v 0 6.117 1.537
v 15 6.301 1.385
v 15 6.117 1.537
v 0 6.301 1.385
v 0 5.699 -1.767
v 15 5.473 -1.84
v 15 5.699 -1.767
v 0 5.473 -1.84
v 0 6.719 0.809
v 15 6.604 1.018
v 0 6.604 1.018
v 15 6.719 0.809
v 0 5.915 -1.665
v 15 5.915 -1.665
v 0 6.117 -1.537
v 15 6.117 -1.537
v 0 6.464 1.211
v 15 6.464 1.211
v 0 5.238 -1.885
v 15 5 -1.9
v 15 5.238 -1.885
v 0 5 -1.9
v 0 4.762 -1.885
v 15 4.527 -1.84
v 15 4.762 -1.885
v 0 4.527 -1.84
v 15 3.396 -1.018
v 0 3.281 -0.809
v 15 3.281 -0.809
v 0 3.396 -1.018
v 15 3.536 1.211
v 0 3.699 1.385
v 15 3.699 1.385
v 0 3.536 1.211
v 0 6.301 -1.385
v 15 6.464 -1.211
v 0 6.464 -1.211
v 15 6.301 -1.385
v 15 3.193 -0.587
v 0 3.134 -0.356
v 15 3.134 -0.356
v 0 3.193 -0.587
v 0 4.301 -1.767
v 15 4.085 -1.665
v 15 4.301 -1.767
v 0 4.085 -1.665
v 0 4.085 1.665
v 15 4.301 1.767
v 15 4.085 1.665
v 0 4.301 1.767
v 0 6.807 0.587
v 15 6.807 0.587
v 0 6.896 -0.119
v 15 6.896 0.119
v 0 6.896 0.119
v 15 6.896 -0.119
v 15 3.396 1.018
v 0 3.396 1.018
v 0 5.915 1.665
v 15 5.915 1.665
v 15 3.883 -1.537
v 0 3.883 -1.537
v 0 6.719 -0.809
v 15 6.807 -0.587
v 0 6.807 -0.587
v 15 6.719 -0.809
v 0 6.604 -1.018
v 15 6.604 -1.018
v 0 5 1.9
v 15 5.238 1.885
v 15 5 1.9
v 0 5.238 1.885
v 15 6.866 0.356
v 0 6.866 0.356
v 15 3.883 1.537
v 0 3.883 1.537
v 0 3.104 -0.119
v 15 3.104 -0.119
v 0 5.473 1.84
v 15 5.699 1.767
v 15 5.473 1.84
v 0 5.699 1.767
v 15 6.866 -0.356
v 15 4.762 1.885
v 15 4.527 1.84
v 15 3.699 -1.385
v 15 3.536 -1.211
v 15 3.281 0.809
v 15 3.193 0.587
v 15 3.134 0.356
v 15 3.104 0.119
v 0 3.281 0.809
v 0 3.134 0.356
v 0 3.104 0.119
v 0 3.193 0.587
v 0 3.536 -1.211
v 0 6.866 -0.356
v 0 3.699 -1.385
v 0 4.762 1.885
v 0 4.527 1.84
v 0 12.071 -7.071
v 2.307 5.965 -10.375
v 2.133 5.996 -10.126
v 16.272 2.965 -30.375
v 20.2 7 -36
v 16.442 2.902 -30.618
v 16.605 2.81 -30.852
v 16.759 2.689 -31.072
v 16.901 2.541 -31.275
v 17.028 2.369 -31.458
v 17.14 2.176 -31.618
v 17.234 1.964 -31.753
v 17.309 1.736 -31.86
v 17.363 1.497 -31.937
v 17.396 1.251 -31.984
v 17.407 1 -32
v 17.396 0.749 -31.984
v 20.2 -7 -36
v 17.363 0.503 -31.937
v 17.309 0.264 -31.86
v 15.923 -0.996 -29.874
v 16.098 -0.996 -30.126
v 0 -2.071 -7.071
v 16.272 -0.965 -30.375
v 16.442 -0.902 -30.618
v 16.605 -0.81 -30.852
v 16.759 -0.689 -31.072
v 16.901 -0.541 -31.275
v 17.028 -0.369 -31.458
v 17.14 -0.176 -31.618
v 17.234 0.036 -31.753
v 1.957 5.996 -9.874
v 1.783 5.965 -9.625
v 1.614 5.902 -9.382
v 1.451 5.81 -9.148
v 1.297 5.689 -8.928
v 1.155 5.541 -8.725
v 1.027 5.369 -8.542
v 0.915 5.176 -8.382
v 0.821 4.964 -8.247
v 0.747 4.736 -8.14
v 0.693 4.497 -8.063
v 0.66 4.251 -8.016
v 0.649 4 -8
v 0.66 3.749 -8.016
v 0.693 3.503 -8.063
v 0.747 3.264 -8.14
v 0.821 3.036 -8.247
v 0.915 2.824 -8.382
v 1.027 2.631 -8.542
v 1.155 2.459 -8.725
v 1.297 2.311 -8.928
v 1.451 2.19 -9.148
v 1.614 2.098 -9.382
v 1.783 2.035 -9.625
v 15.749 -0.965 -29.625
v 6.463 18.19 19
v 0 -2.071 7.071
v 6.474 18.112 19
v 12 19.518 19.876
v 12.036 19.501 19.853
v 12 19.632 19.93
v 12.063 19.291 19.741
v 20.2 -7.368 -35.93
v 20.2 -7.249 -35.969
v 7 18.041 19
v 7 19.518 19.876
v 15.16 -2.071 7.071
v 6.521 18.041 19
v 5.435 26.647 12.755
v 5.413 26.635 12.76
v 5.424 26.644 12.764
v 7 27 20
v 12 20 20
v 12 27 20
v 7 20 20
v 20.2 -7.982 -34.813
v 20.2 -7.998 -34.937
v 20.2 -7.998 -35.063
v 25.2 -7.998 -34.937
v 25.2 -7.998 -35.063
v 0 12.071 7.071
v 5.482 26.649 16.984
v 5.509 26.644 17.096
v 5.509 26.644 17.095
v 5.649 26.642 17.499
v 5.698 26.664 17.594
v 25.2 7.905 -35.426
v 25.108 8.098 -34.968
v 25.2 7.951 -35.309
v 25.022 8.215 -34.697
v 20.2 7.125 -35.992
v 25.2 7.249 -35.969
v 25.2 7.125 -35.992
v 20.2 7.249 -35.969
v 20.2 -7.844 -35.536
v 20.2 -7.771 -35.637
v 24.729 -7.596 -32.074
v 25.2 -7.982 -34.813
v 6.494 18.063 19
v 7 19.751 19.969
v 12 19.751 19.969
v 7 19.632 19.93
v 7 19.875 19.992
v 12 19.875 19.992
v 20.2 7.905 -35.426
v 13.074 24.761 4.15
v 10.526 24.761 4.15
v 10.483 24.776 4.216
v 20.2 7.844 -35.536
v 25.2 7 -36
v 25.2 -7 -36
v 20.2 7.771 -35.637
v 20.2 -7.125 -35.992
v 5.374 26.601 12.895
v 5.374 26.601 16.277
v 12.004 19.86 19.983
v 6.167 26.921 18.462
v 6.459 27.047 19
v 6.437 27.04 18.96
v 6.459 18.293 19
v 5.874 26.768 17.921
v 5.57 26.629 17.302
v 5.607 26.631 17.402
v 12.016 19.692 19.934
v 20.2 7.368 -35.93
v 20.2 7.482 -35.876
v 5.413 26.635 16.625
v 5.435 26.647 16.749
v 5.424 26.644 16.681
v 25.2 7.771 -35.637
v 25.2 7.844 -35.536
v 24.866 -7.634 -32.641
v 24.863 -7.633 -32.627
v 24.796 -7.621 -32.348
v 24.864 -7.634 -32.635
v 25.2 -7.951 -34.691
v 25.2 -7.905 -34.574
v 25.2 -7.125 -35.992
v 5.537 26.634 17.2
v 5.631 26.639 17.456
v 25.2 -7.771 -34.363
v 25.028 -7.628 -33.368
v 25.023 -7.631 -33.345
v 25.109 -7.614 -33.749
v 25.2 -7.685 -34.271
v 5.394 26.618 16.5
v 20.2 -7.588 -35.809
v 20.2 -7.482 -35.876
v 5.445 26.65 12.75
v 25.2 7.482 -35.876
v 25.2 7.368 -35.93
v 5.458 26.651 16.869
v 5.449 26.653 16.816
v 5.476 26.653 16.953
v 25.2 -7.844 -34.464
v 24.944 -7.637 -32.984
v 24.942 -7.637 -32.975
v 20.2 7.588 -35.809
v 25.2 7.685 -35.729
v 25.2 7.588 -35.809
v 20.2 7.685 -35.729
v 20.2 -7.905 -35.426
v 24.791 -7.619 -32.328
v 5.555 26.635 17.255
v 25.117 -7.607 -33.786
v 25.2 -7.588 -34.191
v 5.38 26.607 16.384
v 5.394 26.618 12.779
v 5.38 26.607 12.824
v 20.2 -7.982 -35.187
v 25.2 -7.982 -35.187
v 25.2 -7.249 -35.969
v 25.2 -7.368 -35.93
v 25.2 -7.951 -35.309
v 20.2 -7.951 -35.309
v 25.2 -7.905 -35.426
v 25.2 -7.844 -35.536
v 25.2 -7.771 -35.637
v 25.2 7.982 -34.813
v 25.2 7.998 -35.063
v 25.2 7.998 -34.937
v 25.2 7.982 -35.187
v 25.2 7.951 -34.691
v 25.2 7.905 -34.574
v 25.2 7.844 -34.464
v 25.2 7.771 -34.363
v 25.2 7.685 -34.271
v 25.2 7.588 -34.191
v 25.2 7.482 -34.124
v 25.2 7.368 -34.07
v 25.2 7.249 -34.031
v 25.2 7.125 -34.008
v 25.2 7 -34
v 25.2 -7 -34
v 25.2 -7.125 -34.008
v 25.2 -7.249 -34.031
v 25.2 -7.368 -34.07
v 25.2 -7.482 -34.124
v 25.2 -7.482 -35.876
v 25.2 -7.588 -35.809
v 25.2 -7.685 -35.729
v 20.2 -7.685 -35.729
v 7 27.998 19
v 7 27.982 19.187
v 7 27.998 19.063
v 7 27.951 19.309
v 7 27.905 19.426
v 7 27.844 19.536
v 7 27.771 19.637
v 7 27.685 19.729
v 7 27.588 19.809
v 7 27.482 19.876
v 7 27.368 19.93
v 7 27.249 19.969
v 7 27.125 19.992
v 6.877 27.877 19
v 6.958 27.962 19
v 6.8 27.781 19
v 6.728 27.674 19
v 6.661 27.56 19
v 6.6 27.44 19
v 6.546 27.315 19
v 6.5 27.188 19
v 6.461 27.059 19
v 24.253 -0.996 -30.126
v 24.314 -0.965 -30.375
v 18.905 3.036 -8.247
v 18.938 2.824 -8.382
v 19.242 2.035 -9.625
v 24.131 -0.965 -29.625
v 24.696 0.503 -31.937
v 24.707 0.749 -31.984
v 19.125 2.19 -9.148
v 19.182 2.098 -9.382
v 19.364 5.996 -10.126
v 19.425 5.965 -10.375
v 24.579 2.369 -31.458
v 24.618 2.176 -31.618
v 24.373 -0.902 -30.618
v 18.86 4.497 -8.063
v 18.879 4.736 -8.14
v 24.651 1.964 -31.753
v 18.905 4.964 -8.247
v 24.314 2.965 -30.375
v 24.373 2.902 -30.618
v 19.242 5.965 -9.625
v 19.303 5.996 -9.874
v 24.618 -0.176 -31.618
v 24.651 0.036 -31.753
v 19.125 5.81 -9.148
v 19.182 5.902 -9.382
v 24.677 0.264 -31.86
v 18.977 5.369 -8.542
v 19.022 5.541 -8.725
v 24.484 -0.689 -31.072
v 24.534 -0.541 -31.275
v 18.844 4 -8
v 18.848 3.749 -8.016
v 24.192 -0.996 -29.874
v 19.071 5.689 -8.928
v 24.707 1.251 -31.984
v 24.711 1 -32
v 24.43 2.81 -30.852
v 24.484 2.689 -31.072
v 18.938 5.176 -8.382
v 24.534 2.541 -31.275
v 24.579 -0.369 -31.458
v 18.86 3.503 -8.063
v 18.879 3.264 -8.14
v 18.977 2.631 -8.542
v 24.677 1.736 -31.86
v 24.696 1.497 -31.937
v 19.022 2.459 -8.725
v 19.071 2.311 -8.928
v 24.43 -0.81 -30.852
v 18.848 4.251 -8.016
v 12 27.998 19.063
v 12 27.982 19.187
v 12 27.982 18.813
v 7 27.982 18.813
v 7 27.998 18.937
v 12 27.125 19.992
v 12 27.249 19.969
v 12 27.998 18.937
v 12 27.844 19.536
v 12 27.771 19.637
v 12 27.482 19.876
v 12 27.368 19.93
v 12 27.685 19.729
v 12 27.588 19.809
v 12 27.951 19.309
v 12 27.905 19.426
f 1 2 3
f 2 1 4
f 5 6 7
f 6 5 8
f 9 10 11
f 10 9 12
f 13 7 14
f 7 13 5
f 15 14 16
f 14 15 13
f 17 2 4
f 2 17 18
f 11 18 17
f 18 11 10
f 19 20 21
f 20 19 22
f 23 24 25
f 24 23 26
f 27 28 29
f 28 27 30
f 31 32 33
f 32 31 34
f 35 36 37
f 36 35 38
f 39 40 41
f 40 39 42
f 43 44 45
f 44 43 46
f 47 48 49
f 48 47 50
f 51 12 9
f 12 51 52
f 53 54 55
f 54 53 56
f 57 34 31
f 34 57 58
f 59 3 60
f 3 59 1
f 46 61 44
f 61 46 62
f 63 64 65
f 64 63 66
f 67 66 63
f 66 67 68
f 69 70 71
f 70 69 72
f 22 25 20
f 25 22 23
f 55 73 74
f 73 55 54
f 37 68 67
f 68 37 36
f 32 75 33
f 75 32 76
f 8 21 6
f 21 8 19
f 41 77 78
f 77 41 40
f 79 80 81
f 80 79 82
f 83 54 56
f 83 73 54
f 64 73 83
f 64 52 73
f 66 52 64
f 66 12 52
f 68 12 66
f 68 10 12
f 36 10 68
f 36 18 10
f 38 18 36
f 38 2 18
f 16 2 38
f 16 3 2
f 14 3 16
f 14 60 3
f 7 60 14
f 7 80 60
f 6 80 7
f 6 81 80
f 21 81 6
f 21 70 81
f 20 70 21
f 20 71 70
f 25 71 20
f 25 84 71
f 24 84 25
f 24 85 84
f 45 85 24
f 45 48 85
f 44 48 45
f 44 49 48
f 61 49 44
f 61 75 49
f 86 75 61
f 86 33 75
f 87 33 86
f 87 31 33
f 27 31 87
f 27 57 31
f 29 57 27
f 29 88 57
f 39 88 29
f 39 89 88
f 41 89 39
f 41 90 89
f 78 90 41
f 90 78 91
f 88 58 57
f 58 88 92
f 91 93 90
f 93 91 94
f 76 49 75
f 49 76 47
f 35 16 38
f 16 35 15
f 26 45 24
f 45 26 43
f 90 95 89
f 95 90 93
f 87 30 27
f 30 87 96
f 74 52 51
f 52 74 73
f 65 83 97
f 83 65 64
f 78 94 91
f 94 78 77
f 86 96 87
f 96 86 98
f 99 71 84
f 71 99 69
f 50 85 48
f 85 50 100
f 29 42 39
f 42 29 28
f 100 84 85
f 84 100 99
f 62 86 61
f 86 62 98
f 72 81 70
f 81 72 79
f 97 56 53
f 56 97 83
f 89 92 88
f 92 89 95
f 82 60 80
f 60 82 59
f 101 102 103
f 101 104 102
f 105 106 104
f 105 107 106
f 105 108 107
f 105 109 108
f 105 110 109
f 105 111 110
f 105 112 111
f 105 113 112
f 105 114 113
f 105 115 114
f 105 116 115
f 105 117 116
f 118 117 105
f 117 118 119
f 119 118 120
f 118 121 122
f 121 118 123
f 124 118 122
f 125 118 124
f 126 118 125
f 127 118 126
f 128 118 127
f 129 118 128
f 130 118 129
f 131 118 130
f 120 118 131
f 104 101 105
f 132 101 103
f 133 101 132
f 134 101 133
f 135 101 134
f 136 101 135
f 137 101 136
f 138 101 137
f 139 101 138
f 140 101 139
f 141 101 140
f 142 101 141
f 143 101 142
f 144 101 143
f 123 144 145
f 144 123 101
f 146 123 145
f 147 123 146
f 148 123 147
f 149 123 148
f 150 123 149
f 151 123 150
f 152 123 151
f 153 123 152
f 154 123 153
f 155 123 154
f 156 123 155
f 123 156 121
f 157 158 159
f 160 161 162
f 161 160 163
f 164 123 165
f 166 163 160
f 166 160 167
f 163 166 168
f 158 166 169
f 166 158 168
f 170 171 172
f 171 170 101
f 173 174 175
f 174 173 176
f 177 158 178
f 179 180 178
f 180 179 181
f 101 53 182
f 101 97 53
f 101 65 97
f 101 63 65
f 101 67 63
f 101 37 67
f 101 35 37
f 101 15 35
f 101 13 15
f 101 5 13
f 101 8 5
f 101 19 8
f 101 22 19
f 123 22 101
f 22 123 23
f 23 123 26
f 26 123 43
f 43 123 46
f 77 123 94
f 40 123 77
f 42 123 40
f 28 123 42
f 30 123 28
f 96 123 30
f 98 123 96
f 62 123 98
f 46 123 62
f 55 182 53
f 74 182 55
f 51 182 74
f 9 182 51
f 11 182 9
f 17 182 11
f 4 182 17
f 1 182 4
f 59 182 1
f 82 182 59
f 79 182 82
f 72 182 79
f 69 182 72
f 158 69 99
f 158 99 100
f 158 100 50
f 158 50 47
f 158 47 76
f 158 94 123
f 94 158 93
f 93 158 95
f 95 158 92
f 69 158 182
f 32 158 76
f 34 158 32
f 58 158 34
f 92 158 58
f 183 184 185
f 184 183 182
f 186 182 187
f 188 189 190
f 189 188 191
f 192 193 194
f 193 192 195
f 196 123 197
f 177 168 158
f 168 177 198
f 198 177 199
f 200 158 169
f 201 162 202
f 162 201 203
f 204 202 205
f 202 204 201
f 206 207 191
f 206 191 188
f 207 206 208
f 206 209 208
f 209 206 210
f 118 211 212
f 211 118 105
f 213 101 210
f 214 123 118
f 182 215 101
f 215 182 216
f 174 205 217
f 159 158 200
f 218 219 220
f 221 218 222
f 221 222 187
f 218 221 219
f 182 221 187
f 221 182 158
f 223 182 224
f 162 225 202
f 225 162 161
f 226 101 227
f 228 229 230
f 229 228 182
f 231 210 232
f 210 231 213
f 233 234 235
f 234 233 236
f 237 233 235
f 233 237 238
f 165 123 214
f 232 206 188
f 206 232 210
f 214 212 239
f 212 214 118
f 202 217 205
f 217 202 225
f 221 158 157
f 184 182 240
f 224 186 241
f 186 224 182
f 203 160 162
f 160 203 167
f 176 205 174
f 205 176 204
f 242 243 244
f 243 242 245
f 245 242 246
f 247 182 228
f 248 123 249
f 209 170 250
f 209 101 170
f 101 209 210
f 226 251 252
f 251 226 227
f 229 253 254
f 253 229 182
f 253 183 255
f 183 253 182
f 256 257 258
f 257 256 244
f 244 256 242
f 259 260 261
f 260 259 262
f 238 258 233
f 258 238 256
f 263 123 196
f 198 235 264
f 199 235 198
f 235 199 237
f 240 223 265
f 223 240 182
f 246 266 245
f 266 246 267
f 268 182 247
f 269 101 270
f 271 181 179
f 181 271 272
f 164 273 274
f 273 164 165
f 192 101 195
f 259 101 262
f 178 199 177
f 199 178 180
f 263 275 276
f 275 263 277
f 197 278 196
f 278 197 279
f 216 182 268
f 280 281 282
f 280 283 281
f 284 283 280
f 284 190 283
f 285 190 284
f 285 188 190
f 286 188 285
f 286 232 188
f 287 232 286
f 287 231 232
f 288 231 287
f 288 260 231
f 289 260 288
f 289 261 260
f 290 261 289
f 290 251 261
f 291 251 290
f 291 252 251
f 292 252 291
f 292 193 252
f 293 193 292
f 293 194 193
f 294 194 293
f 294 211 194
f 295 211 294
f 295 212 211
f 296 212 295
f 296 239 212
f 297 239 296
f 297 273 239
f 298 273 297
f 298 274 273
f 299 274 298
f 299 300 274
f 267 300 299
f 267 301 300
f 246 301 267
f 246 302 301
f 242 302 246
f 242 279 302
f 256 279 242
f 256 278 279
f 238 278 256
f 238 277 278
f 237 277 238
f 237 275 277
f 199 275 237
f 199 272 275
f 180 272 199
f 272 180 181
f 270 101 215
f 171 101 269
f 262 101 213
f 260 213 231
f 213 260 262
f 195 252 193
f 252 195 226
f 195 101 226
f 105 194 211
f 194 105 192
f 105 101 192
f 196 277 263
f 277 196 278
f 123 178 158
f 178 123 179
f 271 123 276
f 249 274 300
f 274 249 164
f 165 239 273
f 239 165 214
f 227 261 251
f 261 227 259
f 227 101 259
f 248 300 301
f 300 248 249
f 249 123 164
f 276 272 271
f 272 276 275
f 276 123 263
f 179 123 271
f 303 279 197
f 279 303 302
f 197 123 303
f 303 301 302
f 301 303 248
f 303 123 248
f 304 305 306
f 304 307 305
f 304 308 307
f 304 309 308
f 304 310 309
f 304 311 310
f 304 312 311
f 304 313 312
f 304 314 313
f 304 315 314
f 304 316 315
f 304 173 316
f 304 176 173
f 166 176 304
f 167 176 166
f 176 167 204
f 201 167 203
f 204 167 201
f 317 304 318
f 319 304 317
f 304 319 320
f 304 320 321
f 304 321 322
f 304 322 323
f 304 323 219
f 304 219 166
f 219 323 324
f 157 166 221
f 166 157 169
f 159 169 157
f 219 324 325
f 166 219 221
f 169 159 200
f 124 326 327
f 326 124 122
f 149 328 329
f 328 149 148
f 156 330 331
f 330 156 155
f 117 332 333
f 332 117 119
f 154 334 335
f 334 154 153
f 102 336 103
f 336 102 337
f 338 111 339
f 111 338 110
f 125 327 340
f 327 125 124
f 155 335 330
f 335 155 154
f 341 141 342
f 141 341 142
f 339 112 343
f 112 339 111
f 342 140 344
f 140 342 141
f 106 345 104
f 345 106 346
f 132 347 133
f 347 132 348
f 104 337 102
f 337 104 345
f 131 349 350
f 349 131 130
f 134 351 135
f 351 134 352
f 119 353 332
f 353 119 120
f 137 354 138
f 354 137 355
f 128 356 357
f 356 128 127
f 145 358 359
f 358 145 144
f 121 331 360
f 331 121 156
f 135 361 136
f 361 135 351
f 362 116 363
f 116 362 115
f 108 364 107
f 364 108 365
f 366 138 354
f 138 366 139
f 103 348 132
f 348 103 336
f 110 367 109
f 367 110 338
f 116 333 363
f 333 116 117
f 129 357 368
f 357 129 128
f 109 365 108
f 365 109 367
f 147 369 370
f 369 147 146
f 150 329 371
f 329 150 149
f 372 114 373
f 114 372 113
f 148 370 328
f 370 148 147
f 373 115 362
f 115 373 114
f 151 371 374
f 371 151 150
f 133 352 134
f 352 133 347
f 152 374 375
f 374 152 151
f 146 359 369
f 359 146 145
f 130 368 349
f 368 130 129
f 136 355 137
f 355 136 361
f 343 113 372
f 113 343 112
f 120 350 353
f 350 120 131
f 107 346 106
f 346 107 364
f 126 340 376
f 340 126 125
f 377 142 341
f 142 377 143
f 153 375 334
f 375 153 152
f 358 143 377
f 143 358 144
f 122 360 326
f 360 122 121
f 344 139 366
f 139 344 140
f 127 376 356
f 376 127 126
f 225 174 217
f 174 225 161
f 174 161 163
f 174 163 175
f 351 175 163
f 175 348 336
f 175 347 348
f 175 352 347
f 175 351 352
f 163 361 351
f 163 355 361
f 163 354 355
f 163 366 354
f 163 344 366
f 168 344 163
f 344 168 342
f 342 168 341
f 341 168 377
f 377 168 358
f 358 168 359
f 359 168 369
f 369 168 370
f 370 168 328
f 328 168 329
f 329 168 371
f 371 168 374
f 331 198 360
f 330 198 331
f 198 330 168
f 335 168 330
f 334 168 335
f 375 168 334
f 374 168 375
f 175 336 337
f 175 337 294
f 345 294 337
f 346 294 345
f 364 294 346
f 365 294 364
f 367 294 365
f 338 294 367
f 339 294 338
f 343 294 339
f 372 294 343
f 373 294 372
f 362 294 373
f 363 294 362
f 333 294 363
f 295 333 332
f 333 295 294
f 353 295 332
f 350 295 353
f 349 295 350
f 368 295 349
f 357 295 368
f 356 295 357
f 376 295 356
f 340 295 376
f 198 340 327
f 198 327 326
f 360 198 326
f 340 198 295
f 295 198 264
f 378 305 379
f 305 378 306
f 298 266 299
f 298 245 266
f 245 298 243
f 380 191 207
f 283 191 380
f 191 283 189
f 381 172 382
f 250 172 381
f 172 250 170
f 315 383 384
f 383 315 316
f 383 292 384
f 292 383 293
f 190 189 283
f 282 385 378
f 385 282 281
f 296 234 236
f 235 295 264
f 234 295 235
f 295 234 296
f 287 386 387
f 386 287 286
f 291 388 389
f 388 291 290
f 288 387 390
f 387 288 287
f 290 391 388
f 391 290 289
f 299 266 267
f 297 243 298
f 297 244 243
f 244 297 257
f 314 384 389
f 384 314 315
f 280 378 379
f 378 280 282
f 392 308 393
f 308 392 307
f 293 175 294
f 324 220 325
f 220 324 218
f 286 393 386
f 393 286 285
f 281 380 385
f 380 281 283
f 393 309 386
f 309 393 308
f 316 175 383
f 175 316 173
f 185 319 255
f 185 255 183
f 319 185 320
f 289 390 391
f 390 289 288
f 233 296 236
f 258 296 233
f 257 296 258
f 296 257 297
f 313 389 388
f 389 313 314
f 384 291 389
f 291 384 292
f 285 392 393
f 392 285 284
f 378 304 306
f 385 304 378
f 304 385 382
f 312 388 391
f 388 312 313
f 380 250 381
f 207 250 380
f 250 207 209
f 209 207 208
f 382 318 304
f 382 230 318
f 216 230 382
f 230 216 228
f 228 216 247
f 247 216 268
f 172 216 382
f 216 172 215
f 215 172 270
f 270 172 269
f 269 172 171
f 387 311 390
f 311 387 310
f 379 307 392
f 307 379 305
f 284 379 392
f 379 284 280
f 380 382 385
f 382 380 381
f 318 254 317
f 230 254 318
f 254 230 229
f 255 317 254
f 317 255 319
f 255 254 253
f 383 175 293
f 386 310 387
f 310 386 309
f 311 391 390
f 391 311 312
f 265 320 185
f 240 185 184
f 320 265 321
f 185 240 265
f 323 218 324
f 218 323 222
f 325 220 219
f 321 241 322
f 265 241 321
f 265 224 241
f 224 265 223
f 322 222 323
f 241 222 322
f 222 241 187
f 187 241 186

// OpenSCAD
$fn=50;

mount_w=5;
mount_x=3+8/2;
mount_h=22;

foot_h=24;

dy=27;

//translate([0,50,0])corner();
//central();
intersection(){
    front();
    
    hull(){
        central();
    }
    
}

incline=mount_x+17+1.2;

module central(){
    difference(){
        hull() {
            for(i=[-1,1]) translate([0,dy/2*i,0]) rotate([0,90,0]) rotate(45) cylinder(h=14,r=12, $fn=4);
                
            for(i=[-1,1]) translate([mount_x,dy/2*i,mount_h-5]) rotate([0,90,0]) cylinder(h=mount_w/2,r=3);
            for(i=[-1,1]) translate([mount_x,dy*i,mount_h-3]) rotate([0,90,0]) cylinder(h=mount_w,r=3-2);
                
            for(i=[-1,1])translate([incline,7*i,-35]) rotate([0,-90,0])  cylinder(h=5,r=1);
                
        }
        
        for(i=[-1,1]) translate([-1,dy/2*i,]) rotate([0,90,0]) cylinder(h=32,r=1.8, center=true);
            
        translate([0,-50,mount_h-3]) cube([mount_x,100,100]);
        
        hull(){
            translate([0,0,-30]) rotate([0,90,0]) cylinder(h=150,r=2, center=true);
            translate([0,0,-10]) rotate([0,90,0]) cylinder(h=150,r=6, center=true);
        }
        
        hull(){
            translate([0,0,30]) rotate([0,90,0]) cylinder(h=150,r=18, center=true);
            translate([0,0,10]) rotate([0,90,0]) cylinder(h=150,r=6, center=true);
        }       
    }
}

module corner(){
    
    hole_x=mount_w+mount_x+3;
    hole_y=dy/2;
    difference(){
        hull() {
            for(i=[-1,1]) translate([0,dy/2*i,0]) rotate([0,90,0])  rotate(45) cylinder(h=12,r=10, $fn=4);
                
         // for(i=[-1,1]) translate([mount_x,dy/2*i,mount_h-5]) rotate([0,90,0]) cylinder(h=mount_w/2,r=5);
         //   for(i=[-1,1]) translate([mount_x,dy/2*i,mount_h-5]) rotate([0,90,0]) cylinder(h=mount_w,r=5-2);
                
            a=0;
            translate([hole_x,hole_y,a])  cylinder(h=mount_h-a,r1=7, r2=4);
        }
        
        for(i=[-1,1]) translate([-1,dy/2*i,0]) rotate([0,90,0]) cylinder(h=32,r=1.5, center=true);
            
        translate([0,-50,mount_h-3]) cube([mount_x+50,100,100]);
        
        translate([hole_x,hole_y,-0])  cylinder(h=150,r=2, center=true);
        
        //translate([0,0,-10]) rotate([0,90,0]) cylinder(h=150,r=10, center=true, $fn=4);
        //translate([0,0,10]) rotate([0,90,0]) cylinder(h=150,r=4, center=true, $fn=4);
    }
}

module front(){
    dy=10;
    difference(){
        hull() {
            for(i=[1]) translate([0,dy/2*i,0]) rotate([0,90,0]) rotate(45) cylinder(h=mount_w+mount_x+6,r=10, $fn=4);
        //#    for(i=[-1]) translate([0,dy/2*i,0]) rotate([0,90,0]) rotate(45) cylinder(h=8,r=4, $fn=44);
        //        for(i=[-1]) translate([0,dy/2*i,-3]) rotate([0,90,0]) rotate(45) cylinder(h=8,r=6, $fn=4);
                    
            a=1.2;
        //    for(i=[2]) translate([mount_x,dy/2*i,mount_h-5]) rotate([0,90,0]) cylinder(h=mount_w/2,r=3);
            for(i=[1,1.5]) translate([mount_x,dy*i*2,mount_h-3]) rotate([0,90,0]) cylinder(h=mount_w,r=3-2);
                
            for(i=[-1,1])translate([incline,7*i,-35]) rotate([0,-90,0])  cylinder(h=5,r=1);
                
        }
        
        for(i=[-1,1]) translate([-1,dy/2*i,]) rotate([0,90,0]) cylinder(h=32,r=1.9, center=true);
            
        translate([0,-50,mount_h-3]) cube([mount_x,100,100]);
        
        hull(){
            translate([0,1,-30]) rotate([0,90,0]) cylinder(h=150,r=2, center=true);
            translate([0,4,-10]) rotate([0,90,0]) cylinder(h=150,r=2, center=true);
        }
    }
}
